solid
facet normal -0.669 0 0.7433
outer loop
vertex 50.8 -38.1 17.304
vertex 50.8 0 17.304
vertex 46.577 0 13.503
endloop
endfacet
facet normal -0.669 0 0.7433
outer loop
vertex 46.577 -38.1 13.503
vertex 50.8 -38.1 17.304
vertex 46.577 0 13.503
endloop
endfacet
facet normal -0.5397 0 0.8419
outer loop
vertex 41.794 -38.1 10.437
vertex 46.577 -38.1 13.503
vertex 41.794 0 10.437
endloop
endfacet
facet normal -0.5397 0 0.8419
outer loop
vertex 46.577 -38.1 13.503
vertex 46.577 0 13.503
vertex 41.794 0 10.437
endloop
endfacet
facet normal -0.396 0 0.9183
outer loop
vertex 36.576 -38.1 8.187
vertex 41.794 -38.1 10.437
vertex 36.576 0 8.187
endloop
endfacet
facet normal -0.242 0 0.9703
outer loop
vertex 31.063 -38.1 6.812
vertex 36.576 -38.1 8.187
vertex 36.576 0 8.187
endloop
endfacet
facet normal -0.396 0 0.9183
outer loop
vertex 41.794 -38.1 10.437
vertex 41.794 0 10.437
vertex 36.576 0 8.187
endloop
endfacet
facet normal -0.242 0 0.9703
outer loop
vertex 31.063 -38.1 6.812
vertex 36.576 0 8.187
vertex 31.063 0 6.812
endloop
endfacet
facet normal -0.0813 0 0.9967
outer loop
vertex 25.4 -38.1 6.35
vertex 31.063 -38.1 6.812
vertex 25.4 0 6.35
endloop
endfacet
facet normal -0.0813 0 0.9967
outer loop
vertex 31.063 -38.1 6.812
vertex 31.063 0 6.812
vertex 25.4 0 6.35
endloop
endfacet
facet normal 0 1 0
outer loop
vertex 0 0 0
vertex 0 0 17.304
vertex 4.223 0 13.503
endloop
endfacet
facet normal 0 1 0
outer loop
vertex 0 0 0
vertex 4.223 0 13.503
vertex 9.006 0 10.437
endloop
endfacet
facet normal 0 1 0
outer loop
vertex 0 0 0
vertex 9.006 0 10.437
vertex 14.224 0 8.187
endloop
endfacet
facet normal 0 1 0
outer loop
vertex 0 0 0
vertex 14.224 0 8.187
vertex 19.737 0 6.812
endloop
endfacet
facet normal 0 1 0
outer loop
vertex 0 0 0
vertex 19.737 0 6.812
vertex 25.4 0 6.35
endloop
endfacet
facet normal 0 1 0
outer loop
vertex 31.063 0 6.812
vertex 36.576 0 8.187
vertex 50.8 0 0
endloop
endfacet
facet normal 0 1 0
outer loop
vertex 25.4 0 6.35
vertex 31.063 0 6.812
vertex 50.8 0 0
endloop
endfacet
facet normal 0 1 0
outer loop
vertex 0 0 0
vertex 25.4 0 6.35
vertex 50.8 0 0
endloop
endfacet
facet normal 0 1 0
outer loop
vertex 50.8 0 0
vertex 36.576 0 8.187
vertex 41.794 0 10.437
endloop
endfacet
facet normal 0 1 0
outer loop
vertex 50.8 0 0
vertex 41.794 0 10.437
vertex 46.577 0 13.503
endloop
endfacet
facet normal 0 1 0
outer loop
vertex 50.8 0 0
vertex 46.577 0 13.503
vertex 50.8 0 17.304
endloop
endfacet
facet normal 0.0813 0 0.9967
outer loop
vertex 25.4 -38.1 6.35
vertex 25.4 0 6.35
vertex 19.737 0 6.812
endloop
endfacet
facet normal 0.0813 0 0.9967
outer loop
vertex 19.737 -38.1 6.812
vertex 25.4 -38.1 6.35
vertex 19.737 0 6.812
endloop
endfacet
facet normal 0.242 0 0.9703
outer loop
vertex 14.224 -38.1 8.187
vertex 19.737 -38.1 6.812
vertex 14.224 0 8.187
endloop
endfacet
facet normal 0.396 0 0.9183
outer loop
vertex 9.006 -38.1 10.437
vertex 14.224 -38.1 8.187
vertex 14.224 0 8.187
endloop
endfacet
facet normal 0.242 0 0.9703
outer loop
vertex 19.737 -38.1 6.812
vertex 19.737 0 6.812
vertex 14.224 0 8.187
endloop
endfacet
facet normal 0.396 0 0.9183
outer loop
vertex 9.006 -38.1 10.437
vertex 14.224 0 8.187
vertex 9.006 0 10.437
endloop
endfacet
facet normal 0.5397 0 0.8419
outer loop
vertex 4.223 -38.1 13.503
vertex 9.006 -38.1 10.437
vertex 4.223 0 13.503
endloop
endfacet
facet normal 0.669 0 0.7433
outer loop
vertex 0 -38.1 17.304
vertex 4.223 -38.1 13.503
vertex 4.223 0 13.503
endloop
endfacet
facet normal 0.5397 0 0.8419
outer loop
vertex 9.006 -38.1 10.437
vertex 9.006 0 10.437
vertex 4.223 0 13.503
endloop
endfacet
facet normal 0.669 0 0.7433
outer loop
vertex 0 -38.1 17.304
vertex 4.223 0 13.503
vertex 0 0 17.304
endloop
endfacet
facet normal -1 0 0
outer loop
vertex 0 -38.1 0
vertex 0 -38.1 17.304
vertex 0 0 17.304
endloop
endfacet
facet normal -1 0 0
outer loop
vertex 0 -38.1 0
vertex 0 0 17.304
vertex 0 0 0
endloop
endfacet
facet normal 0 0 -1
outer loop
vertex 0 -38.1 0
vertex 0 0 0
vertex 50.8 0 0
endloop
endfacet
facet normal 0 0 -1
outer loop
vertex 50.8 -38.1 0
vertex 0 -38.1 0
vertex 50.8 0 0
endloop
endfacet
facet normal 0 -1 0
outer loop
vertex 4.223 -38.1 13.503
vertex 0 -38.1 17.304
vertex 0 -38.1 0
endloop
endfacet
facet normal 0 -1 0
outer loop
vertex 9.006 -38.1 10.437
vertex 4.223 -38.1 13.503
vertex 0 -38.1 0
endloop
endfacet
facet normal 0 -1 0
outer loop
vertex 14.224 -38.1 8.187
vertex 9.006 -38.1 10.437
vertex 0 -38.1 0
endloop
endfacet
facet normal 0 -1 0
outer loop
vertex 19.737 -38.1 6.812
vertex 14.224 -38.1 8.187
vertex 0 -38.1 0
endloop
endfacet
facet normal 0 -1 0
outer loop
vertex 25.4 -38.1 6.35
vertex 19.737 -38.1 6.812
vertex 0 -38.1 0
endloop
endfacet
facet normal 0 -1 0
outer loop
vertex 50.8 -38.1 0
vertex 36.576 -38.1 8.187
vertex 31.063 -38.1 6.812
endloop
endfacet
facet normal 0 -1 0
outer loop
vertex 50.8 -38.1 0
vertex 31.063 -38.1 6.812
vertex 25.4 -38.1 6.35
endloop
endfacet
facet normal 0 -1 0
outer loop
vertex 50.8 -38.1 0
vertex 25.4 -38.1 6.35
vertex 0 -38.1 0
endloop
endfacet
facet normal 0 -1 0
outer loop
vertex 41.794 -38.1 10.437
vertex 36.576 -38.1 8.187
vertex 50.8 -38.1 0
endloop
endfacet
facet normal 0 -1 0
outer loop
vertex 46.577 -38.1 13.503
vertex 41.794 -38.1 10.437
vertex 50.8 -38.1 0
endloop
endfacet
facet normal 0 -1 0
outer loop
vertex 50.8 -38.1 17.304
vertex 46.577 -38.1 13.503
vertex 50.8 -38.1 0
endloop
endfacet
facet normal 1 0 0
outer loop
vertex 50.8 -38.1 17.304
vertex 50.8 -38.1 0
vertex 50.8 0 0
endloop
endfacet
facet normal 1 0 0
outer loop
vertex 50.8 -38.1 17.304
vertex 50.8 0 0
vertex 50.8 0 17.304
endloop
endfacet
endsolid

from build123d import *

# Parameters (mm, degrees)
F1_DEPTH = 38.1


with BuildPart() as f1:
    # F0 (on Front) → F1 (new body)
    with BuildSketch(Plane.XZ):
        with BuildLine():
            Line((0, 17.304276), (0, 0))
            Line((0, 0), (25.4, 0))
            Line((25.4, 0), (25.4, 6.35))
            ThreePointArc((25.4, 6.35), (11.569272, 9.205286), (0, 17.304276))
        make_face()
        with BuildLine():
            Line((25.4, 6.35), (25.4, 0))
            Line((25.4, 0), (50.8, 0))
            Line((50.8, 0), (50.8, 17.304276))
            ThreePointArc((50.8, 17.304276), (39.230728, 9.205286), (25.4, 6.35))
        make_face()
    extrude(amount=F1_DEPTH)


solid = f1.part
